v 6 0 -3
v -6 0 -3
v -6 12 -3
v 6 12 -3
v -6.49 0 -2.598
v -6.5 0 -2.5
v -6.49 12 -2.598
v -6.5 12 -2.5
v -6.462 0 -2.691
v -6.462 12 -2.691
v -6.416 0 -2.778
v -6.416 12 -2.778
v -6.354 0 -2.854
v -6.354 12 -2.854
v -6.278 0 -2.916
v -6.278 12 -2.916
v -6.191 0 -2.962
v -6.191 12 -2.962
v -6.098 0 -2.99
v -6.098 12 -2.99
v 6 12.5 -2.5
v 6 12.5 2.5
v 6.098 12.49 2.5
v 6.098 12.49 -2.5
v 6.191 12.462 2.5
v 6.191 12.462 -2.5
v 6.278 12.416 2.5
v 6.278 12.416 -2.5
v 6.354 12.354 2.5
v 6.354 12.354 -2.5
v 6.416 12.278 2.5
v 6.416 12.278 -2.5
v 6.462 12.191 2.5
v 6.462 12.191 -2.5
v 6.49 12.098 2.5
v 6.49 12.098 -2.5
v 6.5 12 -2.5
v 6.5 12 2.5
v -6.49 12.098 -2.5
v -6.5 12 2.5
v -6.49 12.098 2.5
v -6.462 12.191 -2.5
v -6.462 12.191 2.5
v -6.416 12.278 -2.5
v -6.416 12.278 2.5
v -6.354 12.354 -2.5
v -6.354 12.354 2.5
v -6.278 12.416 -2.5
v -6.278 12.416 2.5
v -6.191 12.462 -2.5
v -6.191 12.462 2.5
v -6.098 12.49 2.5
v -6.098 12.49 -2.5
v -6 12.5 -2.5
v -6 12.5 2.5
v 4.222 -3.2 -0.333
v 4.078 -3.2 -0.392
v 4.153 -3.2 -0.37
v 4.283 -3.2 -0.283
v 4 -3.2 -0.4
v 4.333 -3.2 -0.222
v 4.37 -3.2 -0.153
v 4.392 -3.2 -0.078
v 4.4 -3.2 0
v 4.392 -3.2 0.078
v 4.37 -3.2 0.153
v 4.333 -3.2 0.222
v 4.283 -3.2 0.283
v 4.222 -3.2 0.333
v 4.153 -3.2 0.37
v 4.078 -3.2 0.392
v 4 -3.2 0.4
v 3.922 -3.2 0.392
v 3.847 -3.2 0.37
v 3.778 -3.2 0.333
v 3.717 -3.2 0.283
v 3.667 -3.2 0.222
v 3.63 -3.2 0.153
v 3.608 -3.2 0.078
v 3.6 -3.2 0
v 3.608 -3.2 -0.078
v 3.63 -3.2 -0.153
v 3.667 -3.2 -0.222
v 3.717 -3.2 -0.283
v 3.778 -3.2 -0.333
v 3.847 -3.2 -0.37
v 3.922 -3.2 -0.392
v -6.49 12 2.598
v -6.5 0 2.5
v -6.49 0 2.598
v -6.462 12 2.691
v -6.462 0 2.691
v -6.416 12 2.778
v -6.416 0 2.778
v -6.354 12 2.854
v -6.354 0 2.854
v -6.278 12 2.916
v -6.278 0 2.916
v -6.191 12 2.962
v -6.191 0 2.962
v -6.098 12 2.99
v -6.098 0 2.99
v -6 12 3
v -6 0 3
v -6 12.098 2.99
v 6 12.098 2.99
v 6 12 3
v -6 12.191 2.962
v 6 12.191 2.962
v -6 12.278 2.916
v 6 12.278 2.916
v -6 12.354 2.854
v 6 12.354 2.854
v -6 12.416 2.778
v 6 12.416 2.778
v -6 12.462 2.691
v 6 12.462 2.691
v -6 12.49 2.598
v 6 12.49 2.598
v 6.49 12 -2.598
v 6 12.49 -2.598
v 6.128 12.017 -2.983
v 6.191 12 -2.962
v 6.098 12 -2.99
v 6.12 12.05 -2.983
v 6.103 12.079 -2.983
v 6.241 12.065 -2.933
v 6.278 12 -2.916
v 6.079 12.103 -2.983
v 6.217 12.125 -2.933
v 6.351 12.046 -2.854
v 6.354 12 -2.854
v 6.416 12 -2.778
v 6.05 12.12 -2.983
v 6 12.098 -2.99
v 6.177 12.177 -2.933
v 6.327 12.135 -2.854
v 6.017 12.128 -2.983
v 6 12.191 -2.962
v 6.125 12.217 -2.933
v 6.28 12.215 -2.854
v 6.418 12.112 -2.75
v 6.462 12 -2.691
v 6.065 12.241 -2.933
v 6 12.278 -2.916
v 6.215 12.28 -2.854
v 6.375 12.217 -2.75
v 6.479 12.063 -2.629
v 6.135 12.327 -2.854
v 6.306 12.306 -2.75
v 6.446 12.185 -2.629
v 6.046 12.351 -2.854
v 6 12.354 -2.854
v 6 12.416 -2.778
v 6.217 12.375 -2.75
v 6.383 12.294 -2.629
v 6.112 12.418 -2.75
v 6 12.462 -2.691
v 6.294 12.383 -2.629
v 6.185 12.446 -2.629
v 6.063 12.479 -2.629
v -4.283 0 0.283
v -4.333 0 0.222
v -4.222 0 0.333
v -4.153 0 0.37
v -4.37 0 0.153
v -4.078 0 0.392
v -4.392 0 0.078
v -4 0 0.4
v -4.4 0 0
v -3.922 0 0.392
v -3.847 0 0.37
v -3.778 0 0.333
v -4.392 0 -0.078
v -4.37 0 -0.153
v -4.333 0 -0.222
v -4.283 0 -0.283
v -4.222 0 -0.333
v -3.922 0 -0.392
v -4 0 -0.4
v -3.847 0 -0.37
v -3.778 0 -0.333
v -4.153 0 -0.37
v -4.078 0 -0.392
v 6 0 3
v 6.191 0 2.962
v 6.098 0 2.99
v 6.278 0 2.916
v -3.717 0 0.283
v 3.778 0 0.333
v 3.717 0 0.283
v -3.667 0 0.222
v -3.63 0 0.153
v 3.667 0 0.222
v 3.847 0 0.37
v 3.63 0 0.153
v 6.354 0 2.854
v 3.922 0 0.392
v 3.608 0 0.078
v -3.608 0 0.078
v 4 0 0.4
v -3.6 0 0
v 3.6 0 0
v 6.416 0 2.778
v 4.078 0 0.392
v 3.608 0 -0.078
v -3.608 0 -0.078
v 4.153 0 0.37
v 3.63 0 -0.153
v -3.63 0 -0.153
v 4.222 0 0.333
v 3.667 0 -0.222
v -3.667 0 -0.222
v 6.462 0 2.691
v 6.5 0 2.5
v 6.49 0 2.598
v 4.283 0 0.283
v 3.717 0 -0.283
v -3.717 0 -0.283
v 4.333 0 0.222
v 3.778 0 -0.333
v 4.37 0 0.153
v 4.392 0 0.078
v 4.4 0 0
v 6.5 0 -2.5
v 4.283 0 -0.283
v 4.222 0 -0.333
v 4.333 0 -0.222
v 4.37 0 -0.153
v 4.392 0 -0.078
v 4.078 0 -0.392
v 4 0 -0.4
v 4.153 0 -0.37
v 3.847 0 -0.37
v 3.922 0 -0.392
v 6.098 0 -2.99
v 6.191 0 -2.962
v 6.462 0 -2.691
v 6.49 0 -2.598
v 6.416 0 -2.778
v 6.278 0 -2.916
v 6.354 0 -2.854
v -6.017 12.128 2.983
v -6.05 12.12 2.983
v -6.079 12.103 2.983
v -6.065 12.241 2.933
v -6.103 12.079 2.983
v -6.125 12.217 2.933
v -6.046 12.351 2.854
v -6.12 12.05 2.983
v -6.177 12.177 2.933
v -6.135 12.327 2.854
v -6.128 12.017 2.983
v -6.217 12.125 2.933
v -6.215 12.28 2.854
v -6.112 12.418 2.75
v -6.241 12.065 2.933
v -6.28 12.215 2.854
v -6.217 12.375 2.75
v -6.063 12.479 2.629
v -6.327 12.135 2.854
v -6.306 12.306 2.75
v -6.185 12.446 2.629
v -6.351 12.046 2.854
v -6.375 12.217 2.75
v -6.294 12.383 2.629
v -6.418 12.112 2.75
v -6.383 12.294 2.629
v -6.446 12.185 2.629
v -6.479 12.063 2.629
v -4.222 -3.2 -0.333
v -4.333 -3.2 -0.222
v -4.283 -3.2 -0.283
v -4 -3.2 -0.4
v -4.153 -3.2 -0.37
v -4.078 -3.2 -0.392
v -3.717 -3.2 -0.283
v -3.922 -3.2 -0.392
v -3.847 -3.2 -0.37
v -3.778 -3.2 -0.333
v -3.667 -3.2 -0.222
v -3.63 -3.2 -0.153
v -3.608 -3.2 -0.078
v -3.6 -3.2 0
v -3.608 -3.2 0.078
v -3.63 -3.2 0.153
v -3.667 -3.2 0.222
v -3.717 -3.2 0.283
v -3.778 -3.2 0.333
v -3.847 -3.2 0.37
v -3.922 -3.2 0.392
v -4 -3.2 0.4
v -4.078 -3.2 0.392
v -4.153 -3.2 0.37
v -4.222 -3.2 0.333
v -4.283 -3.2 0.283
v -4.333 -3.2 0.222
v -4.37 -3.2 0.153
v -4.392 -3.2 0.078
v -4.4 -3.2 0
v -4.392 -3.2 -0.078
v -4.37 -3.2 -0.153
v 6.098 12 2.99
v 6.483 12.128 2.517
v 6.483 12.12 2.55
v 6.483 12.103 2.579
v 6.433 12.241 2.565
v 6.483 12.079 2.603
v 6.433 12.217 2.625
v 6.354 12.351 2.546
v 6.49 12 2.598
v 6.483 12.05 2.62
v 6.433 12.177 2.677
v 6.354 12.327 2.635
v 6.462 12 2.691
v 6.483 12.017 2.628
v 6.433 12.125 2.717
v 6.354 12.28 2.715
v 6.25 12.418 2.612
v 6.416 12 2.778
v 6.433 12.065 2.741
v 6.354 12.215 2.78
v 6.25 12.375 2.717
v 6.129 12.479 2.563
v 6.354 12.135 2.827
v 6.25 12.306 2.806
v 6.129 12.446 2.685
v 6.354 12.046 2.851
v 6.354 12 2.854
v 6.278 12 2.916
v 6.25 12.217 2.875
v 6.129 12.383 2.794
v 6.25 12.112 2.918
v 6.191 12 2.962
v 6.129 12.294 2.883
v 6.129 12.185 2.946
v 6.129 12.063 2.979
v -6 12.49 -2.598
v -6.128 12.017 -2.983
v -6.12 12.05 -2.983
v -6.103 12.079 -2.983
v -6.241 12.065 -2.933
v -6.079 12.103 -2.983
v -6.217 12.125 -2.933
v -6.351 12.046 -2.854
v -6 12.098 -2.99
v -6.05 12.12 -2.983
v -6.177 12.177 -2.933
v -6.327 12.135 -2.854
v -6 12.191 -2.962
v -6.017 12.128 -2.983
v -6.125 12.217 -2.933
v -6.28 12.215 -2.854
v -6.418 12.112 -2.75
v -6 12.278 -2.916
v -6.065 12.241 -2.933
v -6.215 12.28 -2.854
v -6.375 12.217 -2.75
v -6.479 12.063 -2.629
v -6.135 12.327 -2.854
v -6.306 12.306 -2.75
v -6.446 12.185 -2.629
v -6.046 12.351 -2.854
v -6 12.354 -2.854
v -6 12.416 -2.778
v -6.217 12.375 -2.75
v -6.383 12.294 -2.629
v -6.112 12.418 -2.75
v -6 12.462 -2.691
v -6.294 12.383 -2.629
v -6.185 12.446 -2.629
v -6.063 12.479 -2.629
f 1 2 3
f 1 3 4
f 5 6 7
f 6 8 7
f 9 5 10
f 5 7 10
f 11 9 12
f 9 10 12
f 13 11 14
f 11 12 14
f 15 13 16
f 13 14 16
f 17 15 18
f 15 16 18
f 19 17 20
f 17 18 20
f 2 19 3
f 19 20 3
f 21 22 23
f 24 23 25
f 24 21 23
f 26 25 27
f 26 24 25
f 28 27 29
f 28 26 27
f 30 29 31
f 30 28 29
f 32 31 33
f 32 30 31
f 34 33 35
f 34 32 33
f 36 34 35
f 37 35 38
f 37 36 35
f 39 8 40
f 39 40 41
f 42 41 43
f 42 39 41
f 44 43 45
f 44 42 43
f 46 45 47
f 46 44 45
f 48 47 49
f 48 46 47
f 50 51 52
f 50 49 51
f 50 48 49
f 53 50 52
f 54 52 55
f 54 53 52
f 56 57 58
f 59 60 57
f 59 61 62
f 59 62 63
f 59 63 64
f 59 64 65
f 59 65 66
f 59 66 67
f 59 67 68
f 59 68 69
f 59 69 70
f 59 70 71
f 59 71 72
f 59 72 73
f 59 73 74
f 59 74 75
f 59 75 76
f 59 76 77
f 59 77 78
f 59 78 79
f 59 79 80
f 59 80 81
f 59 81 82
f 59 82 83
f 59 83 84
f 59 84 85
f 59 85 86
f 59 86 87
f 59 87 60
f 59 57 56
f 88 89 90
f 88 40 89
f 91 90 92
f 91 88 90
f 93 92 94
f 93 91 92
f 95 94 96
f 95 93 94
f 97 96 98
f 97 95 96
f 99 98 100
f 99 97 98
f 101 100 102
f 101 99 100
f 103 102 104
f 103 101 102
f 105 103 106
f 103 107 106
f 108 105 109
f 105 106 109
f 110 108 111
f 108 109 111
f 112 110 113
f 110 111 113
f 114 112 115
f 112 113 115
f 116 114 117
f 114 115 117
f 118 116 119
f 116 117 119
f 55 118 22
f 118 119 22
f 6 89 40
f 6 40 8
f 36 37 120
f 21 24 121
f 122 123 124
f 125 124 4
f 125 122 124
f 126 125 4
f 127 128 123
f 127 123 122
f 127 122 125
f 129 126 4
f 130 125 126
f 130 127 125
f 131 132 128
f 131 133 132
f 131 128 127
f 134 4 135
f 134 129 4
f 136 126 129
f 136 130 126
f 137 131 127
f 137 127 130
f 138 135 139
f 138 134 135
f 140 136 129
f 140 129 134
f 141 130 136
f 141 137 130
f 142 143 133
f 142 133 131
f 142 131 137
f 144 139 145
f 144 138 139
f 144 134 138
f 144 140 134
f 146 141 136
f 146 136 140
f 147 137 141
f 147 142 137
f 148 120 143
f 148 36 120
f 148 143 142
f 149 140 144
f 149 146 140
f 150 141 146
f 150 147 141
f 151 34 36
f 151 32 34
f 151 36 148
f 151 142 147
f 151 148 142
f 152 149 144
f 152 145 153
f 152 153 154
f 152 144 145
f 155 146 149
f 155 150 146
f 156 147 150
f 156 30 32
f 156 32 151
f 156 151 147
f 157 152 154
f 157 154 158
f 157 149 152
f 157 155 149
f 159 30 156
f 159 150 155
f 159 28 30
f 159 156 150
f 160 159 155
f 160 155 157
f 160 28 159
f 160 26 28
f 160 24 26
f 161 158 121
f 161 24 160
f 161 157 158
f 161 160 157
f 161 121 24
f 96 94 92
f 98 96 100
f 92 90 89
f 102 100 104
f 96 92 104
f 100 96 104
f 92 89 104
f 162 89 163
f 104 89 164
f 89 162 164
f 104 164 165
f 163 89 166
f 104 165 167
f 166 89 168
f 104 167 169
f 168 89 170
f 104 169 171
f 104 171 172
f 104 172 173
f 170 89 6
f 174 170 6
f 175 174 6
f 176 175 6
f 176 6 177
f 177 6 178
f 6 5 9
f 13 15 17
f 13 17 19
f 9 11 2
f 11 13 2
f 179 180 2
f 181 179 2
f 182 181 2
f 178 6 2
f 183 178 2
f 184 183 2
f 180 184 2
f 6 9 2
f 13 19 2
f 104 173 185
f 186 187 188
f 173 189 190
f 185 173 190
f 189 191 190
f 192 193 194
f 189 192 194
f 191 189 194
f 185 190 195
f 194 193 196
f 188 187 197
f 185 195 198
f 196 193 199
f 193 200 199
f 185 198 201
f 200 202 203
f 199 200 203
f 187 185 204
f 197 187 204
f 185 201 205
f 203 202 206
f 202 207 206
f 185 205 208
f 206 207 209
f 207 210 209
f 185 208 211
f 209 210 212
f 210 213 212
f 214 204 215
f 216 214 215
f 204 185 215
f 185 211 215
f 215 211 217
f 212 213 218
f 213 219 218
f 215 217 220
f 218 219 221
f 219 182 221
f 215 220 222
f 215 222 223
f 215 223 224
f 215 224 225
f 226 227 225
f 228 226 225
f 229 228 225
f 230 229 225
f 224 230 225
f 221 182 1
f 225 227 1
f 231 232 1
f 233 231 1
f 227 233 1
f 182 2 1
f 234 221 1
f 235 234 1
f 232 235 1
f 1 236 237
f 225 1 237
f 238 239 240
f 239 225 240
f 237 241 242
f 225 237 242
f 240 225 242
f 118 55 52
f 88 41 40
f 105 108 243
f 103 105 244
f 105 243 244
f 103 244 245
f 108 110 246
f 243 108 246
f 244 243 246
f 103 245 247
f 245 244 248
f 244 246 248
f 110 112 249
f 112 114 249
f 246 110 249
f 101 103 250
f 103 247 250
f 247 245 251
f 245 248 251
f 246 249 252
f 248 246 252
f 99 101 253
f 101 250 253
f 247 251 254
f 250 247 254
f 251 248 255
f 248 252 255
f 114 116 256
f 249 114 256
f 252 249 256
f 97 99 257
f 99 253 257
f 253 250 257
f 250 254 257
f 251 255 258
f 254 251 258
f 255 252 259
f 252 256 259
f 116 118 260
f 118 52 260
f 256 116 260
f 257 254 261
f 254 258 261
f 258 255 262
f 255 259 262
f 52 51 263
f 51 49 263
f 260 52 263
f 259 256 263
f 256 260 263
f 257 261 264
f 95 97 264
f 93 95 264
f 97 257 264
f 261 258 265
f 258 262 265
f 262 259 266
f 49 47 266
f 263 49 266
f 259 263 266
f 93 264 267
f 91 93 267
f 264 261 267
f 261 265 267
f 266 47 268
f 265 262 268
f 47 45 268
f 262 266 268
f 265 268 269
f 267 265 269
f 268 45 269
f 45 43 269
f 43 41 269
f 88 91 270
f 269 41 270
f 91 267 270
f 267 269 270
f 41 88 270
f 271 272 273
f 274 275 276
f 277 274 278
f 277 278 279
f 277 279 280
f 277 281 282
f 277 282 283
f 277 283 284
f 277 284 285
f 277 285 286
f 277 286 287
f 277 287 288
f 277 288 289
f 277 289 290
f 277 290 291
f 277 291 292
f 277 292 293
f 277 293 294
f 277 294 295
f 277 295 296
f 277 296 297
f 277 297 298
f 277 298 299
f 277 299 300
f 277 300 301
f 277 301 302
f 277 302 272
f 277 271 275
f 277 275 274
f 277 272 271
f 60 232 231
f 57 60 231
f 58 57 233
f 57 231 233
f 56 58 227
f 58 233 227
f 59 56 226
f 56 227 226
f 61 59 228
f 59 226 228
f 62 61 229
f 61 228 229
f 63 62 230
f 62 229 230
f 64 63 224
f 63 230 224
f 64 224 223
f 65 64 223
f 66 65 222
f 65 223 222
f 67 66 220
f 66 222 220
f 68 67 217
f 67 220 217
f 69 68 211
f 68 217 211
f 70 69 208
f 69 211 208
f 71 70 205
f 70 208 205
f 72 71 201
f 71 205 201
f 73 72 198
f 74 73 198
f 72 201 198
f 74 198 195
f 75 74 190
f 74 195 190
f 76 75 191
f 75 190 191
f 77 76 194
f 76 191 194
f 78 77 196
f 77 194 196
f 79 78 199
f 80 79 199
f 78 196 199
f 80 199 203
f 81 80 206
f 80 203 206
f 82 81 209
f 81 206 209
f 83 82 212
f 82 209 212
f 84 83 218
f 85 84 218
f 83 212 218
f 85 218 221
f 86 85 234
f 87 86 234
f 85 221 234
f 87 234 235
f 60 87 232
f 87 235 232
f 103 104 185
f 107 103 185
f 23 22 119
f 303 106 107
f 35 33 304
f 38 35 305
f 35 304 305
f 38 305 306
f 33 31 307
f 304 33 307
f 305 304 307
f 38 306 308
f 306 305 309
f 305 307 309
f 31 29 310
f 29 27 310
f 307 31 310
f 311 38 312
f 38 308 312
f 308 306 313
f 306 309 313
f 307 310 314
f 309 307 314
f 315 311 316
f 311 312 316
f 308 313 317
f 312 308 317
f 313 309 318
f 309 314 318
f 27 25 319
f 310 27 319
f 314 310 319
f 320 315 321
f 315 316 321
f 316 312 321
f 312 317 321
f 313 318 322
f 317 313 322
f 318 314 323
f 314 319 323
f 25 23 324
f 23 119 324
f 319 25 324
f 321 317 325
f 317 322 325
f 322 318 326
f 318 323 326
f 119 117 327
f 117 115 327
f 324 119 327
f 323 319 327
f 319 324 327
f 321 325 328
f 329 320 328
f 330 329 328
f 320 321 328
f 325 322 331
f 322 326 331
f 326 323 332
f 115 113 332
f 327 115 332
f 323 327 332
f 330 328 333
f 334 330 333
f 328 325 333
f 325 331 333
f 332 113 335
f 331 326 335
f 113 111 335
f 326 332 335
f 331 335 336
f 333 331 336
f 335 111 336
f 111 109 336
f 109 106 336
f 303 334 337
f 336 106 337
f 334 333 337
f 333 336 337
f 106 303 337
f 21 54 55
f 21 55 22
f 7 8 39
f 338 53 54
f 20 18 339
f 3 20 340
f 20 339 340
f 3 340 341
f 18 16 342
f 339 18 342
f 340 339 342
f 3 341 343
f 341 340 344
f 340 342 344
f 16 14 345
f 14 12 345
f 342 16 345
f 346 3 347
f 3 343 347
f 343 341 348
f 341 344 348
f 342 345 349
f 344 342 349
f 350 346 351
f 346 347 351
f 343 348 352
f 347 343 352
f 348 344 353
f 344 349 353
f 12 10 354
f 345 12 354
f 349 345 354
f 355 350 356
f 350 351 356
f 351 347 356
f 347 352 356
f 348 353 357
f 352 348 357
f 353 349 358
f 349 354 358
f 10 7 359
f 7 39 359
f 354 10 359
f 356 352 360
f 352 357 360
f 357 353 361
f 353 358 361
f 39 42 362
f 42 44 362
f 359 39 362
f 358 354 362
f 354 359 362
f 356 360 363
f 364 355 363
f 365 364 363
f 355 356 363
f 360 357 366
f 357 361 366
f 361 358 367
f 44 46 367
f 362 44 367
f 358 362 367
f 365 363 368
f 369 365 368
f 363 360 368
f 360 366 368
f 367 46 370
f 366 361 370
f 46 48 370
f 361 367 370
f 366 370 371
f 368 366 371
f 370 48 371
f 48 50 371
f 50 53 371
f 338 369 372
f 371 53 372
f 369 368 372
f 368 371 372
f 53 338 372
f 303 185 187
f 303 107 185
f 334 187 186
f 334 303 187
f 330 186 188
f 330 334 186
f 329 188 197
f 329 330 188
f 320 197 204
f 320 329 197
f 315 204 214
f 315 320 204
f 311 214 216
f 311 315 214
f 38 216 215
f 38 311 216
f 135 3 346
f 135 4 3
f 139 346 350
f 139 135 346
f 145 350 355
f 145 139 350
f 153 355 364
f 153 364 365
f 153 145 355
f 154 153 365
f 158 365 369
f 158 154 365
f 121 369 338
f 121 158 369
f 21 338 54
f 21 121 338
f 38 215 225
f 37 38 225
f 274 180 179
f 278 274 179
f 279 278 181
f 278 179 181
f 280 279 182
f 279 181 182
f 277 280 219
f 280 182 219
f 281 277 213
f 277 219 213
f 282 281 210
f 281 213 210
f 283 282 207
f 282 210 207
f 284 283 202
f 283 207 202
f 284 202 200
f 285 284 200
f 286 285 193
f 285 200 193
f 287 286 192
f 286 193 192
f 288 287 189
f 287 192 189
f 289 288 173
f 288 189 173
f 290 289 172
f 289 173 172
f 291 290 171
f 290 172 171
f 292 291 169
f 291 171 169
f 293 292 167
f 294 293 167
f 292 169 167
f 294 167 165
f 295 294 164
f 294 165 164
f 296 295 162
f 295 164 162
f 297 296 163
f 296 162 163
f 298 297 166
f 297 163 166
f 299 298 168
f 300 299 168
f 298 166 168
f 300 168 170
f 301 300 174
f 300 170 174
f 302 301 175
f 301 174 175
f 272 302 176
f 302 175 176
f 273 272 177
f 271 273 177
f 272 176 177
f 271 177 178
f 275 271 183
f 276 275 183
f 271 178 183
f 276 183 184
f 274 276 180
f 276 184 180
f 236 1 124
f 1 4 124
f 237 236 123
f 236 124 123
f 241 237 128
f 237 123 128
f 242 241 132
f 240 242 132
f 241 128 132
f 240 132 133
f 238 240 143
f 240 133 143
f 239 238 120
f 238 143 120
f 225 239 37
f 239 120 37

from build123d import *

# Parameters (mm, degrees)
SKETCH_2_W      = 13
SKETCH_2_H      = 6
EXTRUDE_1_DEPTH = 12.5
SKETCH_3_R      = 0.4
EXTRUDE_2_DEPTH = 3.2
FILLET_1_R      = 0.5


with BuildPart() as part:
    # Эскиз2 → Бобышка-Вытянуть1 (new body)
    with BuildSketch(Plane(origin=(0, 0, 0), x_dir=(1, 0, 0), z_dir=(0, 1, 0))):
        Rectangle(SKETCH_2_W, SKETCH_2_H)
    extrude(amount=EXTRUDE_1_DEPTH)

    # Эскиз3 → Бобышка-Вытянуть2 (add)
    with BuildSketch(Plane.XZ):
        with Locations(Location((-4, 0, 0), (0, 0, 270))):
            Circle(SKETCH_3_R)
        with Locations(Location((4, 0, 0), (0, 0, 270))):
            Circle(SKETCH_3_R)
    extrude(amount=EXTRUDE_2_DEPTH)

    # Скругление1
    fillet_1_edges = [part.edges().sort_by_distance(p)[0] for p in [
        (-6.5, 12.5, 0),
        (0, 12.5, 3),
        (6.5, 12.5, 0),
        (6.5, 6.25, 3),
        (-6.5, 6.25, 3),
        (-6.5, 6.25, -3),
        (6.5, 6.25, -3),
        (0, 12.5, -3),
    ]]
    fillet(fillet_1_edges, radius=FILLET_1_R)


solid = part.part
